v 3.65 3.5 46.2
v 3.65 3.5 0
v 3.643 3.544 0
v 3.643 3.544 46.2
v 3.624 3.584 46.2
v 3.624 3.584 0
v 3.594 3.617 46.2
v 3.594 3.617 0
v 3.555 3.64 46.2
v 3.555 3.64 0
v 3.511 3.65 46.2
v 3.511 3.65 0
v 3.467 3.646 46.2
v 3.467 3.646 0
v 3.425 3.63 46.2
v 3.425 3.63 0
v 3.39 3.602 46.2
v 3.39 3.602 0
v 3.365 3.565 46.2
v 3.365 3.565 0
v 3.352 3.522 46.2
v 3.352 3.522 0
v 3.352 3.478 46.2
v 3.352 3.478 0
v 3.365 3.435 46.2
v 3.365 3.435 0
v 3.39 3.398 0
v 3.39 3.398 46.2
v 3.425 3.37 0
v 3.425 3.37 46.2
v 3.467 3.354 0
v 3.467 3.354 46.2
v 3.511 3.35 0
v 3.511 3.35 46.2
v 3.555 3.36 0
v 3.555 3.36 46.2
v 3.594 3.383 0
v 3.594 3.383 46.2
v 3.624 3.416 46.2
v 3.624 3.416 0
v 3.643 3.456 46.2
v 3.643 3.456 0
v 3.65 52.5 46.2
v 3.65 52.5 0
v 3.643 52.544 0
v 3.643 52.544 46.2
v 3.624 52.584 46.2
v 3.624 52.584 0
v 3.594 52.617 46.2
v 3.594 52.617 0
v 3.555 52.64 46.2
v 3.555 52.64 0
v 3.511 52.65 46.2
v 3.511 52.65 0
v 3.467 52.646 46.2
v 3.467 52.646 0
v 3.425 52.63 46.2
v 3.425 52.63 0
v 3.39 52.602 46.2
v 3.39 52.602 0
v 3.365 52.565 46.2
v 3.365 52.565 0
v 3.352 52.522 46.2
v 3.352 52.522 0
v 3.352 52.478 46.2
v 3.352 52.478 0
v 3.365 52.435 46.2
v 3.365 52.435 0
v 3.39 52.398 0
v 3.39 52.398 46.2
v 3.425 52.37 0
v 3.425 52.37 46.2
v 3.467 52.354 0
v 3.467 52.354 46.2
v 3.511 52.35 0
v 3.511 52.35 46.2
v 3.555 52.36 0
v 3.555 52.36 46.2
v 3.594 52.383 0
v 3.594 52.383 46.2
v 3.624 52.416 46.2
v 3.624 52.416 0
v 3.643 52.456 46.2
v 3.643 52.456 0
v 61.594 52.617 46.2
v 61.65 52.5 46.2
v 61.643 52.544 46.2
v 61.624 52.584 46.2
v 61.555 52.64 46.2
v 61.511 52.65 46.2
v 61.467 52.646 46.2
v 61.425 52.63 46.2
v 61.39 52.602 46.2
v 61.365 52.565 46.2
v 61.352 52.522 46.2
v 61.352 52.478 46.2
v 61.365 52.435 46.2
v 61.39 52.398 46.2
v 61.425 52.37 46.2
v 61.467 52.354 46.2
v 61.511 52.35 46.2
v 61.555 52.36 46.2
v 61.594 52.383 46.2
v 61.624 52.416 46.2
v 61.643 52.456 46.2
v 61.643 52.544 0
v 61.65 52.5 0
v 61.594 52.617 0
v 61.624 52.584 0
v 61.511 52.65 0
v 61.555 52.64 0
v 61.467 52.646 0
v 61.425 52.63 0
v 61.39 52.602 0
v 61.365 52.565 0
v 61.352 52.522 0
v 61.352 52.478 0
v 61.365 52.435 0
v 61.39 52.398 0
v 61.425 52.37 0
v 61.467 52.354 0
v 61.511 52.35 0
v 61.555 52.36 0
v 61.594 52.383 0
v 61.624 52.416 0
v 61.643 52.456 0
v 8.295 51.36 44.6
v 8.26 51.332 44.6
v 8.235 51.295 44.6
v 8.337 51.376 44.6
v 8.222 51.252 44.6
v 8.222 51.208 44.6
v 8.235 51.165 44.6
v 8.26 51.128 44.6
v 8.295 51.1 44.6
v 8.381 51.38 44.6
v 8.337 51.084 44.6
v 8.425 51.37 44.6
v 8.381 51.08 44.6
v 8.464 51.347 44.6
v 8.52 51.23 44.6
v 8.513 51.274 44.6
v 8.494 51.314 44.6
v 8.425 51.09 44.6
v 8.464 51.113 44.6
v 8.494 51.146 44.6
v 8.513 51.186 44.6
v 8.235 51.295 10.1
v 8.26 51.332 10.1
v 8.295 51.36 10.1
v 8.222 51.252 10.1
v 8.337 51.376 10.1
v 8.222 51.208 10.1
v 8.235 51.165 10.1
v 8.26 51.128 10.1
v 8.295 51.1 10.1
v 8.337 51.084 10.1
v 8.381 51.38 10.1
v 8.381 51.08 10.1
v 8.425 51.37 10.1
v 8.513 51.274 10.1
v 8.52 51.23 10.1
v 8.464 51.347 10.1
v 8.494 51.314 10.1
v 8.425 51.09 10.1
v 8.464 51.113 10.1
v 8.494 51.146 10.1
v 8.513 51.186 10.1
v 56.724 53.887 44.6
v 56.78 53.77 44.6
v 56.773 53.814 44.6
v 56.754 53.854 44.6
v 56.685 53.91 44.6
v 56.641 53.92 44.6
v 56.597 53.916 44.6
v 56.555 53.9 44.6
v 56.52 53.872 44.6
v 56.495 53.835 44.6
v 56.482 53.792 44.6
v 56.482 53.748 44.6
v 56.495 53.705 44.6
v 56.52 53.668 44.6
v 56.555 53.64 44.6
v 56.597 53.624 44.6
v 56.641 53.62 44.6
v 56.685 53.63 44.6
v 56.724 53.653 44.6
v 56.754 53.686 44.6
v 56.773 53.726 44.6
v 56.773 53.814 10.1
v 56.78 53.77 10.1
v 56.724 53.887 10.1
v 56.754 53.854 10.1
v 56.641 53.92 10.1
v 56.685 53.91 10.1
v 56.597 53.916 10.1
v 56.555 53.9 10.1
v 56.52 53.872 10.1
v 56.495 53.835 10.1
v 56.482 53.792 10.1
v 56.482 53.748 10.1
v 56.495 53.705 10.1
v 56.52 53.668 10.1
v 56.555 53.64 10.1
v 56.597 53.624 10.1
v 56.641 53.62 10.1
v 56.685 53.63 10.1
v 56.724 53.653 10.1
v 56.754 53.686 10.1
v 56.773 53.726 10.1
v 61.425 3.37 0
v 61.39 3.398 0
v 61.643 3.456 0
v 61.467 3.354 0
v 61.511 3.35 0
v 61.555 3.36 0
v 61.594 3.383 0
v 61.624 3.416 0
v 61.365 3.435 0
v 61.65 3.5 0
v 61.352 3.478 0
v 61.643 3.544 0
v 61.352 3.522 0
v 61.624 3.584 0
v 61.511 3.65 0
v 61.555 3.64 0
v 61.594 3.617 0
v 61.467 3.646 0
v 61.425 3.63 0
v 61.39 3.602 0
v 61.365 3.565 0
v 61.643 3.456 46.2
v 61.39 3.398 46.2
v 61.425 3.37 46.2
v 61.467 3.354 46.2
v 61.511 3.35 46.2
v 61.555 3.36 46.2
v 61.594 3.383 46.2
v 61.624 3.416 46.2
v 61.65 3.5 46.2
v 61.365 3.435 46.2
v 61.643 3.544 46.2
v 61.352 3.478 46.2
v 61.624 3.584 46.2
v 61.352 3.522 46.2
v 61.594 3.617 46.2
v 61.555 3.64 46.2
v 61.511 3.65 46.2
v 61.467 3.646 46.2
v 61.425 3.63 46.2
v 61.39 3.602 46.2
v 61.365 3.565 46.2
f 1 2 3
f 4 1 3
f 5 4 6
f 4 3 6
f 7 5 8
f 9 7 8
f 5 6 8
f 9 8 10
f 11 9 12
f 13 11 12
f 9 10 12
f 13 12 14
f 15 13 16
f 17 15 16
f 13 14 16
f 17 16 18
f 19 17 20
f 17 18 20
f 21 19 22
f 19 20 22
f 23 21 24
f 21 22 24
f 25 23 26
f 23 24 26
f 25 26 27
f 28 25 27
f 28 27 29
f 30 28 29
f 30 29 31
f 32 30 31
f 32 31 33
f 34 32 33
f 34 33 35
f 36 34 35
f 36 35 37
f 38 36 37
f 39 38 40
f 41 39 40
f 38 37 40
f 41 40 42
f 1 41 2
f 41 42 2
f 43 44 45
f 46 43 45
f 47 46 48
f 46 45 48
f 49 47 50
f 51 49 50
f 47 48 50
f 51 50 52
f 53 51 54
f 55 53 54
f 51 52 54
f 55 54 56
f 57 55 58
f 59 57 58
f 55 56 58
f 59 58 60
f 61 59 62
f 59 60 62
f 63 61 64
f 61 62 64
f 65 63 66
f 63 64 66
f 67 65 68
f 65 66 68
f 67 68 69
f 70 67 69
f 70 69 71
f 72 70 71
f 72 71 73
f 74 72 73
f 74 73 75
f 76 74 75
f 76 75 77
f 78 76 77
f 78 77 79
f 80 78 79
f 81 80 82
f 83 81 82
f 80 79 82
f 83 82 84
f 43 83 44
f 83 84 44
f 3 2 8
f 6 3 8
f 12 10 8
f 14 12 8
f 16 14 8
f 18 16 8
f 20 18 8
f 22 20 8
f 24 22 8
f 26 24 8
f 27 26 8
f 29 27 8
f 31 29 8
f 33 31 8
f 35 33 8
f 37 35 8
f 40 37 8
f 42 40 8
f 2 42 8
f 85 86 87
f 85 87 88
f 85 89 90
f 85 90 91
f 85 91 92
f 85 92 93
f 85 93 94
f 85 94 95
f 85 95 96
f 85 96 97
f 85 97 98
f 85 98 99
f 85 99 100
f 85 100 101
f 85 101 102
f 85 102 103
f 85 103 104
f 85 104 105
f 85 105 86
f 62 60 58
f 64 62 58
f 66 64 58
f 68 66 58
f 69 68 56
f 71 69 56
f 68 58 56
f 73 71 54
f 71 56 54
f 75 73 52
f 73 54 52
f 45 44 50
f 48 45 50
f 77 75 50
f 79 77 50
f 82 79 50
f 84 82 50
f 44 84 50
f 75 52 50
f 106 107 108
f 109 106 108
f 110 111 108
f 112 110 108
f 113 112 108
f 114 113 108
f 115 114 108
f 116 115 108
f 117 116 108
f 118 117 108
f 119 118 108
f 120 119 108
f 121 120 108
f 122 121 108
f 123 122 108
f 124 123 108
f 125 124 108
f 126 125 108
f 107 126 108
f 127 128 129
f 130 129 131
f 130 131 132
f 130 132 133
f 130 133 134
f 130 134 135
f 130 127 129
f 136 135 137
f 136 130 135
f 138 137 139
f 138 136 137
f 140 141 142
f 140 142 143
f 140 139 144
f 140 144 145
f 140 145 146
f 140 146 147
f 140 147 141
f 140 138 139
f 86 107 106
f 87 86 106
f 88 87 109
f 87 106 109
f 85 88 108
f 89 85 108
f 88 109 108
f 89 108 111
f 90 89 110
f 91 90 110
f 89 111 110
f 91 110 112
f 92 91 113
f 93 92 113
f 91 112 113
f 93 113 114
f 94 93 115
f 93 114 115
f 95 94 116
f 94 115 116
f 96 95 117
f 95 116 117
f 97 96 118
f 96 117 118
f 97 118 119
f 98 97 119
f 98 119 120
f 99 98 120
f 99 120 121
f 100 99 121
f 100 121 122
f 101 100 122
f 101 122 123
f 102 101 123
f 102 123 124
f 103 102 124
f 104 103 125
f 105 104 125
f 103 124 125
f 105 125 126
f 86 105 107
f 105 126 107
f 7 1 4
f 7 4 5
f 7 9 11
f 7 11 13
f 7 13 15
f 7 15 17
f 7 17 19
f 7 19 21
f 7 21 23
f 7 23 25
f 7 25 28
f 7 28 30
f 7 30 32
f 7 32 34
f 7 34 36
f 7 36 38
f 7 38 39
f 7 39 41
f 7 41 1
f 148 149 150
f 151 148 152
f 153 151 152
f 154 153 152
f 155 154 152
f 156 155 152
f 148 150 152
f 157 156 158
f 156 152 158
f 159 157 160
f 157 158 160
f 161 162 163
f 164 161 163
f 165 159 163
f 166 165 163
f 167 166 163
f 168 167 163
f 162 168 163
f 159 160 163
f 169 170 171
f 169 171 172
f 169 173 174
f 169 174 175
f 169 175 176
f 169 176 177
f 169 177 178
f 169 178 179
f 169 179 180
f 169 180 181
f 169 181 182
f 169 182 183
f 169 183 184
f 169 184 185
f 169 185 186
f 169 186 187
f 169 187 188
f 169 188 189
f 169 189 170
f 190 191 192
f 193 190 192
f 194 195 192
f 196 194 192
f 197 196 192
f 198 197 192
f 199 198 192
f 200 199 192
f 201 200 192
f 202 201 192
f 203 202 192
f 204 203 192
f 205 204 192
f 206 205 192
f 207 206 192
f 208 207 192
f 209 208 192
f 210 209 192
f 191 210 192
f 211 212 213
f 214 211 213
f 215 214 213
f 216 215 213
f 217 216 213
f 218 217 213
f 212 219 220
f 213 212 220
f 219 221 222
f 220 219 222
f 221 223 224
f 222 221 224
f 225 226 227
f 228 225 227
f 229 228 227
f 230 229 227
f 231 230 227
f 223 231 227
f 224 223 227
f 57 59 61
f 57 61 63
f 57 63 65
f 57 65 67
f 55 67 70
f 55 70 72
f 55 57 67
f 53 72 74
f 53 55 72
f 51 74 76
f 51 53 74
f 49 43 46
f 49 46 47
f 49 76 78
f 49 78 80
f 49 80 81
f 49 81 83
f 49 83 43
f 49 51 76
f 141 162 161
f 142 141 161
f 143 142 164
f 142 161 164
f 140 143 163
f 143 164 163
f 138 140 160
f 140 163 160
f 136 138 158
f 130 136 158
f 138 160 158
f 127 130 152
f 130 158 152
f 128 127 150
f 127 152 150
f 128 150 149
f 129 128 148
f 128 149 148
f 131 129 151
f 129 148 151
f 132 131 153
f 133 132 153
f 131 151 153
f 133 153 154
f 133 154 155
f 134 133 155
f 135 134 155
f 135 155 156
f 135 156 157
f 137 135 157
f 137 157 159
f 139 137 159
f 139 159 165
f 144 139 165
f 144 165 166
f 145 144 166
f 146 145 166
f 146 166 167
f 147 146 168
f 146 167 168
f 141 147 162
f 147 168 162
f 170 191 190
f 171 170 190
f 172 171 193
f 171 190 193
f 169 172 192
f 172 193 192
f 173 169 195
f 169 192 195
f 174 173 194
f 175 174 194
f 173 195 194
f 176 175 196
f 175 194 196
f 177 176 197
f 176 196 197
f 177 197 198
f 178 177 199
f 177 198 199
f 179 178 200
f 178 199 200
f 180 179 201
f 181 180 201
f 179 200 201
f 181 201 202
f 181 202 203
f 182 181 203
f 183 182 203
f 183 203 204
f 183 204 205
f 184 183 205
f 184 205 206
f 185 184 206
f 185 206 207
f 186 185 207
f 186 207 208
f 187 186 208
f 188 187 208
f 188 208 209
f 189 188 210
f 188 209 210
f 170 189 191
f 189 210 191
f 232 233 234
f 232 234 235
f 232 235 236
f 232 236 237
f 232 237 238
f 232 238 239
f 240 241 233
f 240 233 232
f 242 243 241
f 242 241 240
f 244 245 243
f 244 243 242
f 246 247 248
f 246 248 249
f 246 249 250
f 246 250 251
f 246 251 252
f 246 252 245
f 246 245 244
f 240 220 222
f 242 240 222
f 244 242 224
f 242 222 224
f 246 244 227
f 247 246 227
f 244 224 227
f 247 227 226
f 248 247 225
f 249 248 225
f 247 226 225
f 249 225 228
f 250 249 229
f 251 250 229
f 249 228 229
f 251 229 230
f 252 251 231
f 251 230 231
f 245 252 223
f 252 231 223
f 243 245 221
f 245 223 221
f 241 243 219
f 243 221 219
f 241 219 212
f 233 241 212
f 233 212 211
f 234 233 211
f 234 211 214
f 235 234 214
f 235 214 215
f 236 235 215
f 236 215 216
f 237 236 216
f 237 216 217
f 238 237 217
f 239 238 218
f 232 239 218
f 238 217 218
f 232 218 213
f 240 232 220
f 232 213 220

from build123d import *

# Parameters (mm, degrees)
SKETCH1_R      = 0.15
LINE_1_DEPTH   = 46.2
LINE_1_2_DEPTH = 46.2
LINE_1_3_DEPTH = 46.2
LINE_1_4_DEPTH = 46.2
SKETCH2_R      = 0.15
LINE_2_DEPTH   = 34.5
LINE_2_2_DEPTH = 34.5


with BuildPart() as part:
    # Sketch1 → Line_1 (new body)
    with BuildSketch(Plane.XY):
        with Locations((3.5, 3.5)):
            Circle(SKETCH1_R)
    extrude(amount=LINE_1_DEPTH)


with BuildPart() as body_2:
    # Sketch1 → Line_1 2 (new body)
    with BuildSketch(Plane.XY):
        with Locations((61.5, 3.5)):
            Circle(SKETCH1_R)
    extrude(amount=LINE_1_2_DEPTH)


with BuildPart() as body_3:
    # Sketch1 → Line_1 3 (new body)
    with BuildSketch(Plane.XY):
        with Locations((3.5, 52.5)):
            Circle(SKETCH1_R)
    extrude(amount=LINE_1_3_DEPTH)


with BuildPart() as body_4:
    # Sketch1 → Line_1 4 (new body)
    with BuildSketch(Plane.XY):
        with Locations((61.5, 52.5)):
            Circle(SKETCH1_R)
    extrude(amount=LINE_1_4_DEPTH)


with BuildPart() as body_5:
    # Sketch2 → Line_2 (new body)
    with BuildSketch(Plane.XY.offset(10.1)):
        with Locations((8.37, 51.23)):
            Circle(SKETCH2_R)
    extrude(amount=LINE_2_DEPTH)


with BuildPart() as body_6:
    # Sketch2 → Line_2 2 (new body)
    with BuildSketch(Plane.XY.offset(10.1)):
        with Locations((56.63, 53.77)):
            Circle(SKETCH2_R)
    extrude(amount=LINE_2_2_DEPTH)


solid = Compound([part.part, body_2.part, body_3.part, body_4.part, body_5.part, body_6.part])
